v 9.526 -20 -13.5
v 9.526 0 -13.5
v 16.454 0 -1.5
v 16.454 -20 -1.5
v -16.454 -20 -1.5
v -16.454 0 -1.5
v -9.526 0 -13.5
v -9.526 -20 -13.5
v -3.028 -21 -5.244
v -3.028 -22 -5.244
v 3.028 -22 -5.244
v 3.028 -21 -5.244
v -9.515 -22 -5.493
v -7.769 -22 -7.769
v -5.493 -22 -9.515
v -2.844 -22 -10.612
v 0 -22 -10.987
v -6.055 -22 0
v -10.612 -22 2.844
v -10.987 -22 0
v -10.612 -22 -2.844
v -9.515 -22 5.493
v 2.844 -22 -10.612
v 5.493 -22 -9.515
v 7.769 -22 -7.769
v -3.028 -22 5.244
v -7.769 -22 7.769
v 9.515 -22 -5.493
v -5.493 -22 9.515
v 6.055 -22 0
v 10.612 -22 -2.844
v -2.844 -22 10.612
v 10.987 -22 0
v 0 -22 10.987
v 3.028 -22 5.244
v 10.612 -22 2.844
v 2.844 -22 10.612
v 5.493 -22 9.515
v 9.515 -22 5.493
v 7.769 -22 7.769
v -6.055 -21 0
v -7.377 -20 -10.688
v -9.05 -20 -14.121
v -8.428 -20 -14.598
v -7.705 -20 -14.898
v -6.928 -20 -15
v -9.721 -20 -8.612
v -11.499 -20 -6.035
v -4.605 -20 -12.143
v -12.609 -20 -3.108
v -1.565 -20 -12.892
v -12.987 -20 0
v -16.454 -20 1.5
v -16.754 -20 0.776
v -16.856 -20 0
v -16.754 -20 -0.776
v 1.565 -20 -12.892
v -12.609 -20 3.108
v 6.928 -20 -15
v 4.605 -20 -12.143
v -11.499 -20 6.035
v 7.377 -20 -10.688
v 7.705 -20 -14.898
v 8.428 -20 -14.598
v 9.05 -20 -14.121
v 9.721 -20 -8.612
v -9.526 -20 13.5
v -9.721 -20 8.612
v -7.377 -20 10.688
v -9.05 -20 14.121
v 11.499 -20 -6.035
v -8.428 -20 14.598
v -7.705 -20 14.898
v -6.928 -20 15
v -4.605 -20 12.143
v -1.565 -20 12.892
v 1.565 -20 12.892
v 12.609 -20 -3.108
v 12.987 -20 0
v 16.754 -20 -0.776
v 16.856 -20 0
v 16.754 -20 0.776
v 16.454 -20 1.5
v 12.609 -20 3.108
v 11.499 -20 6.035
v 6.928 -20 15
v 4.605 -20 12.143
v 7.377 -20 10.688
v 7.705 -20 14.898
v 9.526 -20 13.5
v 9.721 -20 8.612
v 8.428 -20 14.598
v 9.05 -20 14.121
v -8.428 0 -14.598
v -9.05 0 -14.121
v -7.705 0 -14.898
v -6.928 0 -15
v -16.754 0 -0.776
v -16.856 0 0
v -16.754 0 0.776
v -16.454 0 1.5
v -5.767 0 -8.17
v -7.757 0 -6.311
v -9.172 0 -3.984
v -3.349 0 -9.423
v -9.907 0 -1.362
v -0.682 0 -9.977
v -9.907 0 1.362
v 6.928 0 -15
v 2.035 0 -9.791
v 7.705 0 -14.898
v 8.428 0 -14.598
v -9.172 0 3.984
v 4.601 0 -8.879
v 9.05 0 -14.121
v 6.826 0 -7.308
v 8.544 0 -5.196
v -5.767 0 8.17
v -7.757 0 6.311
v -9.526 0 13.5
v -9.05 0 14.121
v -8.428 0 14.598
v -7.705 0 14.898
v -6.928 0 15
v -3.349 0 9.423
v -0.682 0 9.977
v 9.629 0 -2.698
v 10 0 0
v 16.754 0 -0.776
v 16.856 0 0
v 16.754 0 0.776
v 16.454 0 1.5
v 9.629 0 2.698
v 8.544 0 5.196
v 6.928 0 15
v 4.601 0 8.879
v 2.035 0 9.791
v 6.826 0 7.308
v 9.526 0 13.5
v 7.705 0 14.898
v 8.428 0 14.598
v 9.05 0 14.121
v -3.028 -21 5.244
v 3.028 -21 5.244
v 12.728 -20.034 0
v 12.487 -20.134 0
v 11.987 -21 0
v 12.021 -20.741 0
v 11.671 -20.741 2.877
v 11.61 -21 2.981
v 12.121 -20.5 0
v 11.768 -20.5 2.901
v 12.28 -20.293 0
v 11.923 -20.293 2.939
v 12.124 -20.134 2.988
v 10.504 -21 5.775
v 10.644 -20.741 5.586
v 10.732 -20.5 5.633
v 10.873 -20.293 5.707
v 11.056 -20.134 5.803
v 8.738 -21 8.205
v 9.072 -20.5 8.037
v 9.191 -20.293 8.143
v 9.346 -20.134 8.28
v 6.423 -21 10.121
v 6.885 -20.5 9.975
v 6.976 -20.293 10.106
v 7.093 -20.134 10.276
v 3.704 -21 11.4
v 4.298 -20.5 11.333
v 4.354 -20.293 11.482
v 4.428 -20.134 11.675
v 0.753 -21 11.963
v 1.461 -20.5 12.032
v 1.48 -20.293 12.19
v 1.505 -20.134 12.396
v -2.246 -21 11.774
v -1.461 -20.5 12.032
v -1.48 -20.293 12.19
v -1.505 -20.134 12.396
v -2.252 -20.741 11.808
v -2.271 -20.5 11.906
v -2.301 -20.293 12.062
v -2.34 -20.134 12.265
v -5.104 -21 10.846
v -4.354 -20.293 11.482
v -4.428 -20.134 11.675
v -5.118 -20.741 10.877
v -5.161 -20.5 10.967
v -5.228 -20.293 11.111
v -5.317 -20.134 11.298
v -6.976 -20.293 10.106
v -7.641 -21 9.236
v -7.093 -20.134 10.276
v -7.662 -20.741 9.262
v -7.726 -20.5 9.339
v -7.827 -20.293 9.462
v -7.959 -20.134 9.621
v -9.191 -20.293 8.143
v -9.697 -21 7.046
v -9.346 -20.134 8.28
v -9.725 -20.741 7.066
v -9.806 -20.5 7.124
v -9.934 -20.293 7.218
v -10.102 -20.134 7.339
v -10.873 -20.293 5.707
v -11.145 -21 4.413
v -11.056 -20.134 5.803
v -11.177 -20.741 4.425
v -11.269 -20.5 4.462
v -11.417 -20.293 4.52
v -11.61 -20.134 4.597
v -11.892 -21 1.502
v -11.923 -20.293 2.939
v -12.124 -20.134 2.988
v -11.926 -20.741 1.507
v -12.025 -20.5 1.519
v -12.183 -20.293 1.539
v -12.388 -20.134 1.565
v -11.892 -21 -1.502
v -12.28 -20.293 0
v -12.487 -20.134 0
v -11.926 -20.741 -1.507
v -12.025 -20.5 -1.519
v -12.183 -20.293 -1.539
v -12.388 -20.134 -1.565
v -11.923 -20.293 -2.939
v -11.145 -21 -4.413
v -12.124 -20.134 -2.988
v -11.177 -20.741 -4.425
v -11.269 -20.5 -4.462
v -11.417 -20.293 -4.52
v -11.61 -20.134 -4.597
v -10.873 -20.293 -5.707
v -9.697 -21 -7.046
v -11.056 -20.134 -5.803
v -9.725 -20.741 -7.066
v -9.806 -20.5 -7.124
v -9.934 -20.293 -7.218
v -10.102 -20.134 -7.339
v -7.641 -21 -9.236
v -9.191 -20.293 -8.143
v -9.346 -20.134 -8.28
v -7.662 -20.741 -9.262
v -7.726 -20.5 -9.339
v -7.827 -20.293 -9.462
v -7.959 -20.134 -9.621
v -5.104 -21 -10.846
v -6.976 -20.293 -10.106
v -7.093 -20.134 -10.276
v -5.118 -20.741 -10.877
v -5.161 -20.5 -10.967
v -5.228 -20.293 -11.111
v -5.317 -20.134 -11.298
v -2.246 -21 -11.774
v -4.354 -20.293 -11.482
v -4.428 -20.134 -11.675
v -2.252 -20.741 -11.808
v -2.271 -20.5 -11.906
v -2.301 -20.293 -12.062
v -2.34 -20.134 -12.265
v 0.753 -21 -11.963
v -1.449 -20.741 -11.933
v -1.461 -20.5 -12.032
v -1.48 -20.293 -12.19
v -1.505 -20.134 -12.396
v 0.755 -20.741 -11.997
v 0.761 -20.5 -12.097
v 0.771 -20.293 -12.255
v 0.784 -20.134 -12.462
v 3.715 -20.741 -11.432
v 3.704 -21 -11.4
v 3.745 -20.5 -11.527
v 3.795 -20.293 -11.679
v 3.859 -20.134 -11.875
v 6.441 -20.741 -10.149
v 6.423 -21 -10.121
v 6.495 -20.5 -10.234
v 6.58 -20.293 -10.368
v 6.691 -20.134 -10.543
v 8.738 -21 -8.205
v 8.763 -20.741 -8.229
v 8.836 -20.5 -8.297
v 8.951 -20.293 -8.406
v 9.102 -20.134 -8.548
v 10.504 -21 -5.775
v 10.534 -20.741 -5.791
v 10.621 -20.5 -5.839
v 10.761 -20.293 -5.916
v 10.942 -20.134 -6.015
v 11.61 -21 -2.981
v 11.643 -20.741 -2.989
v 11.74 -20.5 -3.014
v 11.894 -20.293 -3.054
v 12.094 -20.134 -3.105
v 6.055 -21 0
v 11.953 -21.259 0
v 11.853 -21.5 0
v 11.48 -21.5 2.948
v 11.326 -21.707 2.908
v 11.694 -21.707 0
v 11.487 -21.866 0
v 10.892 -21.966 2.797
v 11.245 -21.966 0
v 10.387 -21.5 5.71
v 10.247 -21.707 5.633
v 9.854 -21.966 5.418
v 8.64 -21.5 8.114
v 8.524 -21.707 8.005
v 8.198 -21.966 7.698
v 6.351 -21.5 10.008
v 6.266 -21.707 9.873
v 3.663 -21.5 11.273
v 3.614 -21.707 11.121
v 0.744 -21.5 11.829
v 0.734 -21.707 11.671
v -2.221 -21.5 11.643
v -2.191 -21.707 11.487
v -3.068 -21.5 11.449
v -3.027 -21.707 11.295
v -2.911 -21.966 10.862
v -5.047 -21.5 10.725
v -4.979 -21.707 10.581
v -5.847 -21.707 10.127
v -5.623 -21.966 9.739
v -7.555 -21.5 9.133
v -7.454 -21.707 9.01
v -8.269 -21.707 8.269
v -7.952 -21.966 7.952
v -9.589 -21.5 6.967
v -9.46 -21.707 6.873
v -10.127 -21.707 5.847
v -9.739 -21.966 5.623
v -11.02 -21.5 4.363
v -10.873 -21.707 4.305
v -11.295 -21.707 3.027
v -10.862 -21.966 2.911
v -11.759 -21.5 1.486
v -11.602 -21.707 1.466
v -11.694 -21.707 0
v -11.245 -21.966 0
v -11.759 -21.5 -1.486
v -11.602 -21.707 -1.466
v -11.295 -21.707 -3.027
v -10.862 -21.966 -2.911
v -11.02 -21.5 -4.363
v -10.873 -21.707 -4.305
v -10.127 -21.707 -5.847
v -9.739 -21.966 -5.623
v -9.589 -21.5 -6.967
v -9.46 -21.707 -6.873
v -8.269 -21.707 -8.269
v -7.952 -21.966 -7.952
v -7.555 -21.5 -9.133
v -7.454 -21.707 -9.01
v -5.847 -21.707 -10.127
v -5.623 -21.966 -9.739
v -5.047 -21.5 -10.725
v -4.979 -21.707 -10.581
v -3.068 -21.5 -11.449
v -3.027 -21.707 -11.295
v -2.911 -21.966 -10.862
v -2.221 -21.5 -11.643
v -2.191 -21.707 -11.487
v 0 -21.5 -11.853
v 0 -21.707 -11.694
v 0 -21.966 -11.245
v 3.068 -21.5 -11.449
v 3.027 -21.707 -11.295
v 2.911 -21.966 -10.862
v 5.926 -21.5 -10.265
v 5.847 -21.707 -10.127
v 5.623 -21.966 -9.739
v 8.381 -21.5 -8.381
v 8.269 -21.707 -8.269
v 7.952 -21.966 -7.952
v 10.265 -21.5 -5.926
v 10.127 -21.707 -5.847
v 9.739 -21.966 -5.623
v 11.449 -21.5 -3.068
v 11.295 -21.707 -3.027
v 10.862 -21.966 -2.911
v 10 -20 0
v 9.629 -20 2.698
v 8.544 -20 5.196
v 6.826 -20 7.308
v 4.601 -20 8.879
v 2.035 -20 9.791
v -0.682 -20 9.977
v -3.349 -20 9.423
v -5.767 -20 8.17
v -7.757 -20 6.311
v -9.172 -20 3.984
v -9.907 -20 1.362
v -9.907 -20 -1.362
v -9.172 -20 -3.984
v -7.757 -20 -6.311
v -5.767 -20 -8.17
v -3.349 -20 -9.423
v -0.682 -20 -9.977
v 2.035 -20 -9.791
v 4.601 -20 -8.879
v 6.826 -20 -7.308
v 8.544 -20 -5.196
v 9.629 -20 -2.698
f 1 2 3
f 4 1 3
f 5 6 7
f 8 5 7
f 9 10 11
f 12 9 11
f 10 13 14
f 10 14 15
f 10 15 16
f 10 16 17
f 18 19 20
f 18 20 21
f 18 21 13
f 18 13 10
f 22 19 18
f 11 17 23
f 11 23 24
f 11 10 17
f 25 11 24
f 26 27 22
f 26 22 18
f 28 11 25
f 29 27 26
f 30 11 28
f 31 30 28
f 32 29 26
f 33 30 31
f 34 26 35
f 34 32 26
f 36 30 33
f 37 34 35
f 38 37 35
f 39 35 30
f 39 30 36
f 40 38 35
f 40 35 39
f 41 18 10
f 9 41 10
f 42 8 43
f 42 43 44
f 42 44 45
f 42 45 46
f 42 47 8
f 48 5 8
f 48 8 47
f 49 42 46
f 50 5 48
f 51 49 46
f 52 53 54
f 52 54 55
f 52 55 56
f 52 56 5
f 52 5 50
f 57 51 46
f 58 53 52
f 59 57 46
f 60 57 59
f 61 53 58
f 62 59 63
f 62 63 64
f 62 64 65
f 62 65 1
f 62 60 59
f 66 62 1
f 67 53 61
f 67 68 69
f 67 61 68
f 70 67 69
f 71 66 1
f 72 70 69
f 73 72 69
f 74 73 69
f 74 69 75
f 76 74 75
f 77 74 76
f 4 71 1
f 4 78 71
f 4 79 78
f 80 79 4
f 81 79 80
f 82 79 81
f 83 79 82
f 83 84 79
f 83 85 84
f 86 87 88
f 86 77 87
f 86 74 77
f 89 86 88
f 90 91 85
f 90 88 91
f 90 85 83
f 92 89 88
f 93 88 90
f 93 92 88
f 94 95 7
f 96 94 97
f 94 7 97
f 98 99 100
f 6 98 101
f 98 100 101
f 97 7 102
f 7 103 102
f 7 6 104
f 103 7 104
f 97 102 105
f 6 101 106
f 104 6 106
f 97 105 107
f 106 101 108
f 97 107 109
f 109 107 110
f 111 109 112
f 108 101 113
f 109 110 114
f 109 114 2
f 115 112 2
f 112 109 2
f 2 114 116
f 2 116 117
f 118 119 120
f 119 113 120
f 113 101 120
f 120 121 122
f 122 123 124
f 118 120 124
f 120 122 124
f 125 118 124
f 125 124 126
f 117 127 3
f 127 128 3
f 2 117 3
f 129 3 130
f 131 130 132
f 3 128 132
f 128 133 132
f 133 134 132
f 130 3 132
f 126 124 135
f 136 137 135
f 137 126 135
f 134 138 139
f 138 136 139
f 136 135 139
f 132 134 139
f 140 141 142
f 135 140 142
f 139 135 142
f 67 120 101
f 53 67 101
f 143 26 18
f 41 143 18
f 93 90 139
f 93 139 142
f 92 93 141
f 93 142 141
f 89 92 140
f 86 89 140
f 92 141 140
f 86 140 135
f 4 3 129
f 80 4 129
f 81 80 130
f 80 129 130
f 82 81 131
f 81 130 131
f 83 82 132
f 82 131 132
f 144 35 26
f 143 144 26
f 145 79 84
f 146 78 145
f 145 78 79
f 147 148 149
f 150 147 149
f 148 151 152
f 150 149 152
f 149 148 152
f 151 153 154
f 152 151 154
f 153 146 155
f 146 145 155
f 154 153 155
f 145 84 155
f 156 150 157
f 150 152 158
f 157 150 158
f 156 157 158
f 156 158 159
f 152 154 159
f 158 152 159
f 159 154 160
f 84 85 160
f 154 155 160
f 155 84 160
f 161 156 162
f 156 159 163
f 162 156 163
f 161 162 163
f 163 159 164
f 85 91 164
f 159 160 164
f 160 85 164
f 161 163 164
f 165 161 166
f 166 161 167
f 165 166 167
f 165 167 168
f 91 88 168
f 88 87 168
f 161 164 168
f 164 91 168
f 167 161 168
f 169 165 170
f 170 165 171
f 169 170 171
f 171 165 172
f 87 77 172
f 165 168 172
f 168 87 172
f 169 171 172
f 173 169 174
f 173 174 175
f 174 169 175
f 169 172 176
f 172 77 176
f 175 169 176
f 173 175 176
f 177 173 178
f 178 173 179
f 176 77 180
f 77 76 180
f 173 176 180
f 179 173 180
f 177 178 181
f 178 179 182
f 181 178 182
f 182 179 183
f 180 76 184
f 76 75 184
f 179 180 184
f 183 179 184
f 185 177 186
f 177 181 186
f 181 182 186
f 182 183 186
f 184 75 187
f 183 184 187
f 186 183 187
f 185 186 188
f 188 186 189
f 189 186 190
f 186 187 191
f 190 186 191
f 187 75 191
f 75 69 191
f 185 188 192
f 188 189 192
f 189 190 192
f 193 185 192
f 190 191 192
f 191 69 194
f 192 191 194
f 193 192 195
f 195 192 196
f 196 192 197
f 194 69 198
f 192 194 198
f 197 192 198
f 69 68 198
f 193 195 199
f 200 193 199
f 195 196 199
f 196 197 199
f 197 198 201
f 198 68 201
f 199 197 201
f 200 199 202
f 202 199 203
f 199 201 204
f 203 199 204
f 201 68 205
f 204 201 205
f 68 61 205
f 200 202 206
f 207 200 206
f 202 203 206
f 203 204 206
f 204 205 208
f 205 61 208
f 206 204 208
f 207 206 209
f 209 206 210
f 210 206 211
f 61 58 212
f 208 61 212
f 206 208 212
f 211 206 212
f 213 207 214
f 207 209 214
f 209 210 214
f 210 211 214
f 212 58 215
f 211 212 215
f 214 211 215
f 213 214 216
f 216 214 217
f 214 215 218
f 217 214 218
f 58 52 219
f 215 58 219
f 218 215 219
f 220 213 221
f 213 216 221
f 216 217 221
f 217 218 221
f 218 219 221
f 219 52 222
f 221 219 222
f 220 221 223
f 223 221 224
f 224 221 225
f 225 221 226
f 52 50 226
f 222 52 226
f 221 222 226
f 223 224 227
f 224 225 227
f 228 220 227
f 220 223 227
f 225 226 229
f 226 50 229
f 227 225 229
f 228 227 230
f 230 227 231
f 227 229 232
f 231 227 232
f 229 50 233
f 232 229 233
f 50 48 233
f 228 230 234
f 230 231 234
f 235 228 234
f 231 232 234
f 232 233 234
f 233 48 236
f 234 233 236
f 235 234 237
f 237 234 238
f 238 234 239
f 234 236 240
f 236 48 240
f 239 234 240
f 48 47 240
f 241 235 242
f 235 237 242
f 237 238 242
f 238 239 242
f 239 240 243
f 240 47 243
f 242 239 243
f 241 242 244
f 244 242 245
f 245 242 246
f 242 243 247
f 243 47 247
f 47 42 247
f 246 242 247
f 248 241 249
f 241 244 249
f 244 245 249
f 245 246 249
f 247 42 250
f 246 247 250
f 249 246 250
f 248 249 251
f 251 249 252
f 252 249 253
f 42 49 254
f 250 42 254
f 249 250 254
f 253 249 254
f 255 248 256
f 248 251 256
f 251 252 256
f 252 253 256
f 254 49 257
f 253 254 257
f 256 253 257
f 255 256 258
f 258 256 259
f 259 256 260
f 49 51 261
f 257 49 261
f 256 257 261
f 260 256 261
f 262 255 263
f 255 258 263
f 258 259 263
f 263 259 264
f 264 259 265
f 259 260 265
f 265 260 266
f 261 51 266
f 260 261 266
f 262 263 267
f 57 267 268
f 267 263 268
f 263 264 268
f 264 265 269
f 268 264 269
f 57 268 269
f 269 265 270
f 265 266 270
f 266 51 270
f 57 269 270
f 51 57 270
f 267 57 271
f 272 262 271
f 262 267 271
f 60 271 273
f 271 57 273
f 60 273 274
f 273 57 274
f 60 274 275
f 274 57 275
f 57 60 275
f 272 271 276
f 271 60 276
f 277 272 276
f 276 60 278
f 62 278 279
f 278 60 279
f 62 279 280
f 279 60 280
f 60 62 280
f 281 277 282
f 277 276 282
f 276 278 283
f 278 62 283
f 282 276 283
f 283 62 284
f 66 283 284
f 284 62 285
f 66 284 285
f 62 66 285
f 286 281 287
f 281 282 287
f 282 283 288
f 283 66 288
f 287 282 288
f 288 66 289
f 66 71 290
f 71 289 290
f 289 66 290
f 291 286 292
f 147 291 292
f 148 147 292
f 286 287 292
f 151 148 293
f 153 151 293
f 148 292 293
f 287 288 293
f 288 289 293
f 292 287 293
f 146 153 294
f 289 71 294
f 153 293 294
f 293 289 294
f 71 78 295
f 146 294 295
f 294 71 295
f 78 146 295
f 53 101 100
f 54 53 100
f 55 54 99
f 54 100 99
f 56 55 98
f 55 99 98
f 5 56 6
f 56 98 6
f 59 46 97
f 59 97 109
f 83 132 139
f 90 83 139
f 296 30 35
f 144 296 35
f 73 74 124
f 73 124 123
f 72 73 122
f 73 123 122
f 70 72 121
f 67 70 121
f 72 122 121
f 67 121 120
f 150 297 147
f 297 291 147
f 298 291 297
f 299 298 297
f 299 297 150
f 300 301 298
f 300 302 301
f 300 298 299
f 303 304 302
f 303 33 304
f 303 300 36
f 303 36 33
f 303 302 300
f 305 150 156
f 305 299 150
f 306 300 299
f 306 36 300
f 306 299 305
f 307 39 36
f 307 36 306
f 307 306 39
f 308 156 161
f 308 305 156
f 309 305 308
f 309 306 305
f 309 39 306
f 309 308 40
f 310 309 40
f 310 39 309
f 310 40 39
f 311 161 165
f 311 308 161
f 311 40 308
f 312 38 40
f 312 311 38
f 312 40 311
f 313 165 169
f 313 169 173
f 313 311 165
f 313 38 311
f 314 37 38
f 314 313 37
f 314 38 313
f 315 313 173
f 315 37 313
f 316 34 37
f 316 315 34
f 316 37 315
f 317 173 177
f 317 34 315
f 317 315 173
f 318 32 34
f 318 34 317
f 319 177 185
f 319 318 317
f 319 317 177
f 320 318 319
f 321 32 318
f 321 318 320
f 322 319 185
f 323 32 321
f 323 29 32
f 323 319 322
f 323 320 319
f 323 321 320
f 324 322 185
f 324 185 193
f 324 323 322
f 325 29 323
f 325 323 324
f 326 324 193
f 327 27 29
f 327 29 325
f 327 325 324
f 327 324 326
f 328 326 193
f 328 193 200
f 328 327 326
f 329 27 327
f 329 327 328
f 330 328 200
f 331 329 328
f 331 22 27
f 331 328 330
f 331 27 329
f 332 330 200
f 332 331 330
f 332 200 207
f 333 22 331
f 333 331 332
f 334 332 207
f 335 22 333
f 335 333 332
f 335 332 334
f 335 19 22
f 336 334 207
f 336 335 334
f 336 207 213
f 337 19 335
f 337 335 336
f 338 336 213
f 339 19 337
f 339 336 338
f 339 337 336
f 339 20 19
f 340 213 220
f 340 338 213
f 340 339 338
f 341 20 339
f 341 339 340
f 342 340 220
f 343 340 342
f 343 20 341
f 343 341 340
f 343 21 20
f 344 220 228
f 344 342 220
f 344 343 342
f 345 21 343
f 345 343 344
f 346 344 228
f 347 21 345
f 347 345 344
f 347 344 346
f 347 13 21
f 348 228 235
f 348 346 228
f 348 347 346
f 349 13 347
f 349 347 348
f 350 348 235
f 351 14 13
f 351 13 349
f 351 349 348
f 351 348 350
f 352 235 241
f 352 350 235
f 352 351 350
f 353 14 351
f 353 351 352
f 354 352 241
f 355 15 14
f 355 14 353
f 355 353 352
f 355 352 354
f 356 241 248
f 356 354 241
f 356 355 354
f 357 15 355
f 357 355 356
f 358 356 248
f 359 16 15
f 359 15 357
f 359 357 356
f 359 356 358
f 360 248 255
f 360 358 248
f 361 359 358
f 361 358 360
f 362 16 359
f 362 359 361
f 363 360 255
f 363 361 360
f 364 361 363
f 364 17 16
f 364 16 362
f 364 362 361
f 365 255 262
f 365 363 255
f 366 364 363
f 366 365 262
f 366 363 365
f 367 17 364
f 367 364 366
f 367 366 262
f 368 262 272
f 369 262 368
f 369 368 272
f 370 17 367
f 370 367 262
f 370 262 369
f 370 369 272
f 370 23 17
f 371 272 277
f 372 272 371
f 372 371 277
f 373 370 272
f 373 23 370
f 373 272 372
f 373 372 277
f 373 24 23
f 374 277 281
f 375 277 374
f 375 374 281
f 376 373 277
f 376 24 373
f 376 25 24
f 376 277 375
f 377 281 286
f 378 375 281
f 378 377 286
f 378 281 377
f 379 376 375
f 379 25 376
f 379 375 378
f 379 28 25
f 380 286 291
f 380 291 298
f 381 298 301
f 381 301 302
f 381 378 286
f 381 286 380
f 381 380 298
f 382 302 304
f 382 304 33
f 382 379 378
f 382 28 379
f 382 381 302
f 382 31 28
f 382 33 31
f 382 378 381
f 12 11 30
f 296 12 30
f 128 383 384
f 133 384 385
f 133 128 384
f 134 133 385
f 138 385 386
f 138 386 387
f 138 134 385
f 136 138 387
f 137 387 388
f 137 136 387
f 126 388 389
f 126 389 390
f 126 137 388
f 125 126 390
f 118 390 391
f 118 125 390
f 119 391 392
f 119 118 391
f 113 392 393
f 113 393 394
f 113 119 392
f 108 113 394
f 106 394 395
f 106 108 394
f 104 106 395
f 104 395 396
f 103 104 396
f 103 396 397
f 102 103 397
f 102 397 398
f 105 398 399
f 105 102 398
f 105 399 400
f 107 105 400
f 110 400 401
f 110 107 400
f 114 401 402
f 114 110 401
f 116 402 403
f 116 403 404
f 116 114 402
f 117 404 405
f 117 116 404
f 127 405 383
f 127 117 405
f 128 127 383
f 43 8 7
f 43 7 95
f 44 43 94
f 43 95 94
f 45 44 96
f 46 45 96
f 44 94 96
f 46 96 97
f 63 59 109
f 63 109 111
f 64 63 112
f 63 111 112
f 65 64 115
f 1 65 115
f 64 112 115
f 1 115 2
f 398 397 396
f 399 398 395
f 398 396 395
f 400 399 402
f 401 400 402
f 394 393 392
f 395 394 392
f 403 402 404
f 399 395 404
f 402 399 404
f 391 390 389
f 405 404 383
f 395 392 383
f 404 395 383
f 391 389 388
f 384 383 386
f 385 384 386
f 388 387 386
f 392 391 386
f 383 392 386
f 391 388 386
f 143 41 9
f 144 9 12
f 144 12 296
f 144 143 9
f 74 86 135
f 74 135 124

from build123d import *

# Parameters (mm, degrees)
F0_R     = 10
F1_DEPTH = 20
F2_R     = 11.9866247271
F3_DEPTH = 2
F4_R     = 0.99999
F6_DEPTH = 1


# Not quite as in the source:
# - a fillet or chamfer is up to 0.001 mm smaller than in the source, because OpenCascade refuses the exact size


with BuildPart() as f1:
    # F0 (on Front) → F1 (new body)
    with BuildSketch(Plane.XZ):
        with BuildLine():
            Line((6.9282032303, 15), (-6.9282032303, 15))
            ThreePointArc((-6.9282032303, 15), (-8.4282032303, 14.5980762114), (-9.5262794416, 13.5))
            Line((-9.5262794416, 13.5), (-16.4544826719, 1.5))
            ThreePointArc((-16.4544826719, 1.5), (-16.8564064606, 0), (-16.4544826719, -1.5))
            Line((-16.4544826719, -1.5), (-9.5262794416, -13.5))
            ThreePointArc((-9.5262794416, -13.5), (-8.4282032303, -14.5980762114), (-6.9282032303, -15))
            Line((-6.9282032303, -15), (6.9282032303, -15))
            ThreePointArc((6.9282032303, -15), (8.4282032303, -14.5980762114), (9.5262794416, -13.5))
            Line((9.5262794416, -13.5), (16.4544826719, -1.5))
            ThreePointArc((16.4544826719, -1.5), (16.8564064606, 0), (16.4544826719, 1.5))
            Line((16.4544826719, 1.5), (9.5262794416, 13.5))
            ThreePointArc((9.5262794416, 13.5), (8.4282032303, 14.5980762114), (6.9282032303, 15))
        make_face()
        Circle(F0_R, mode=Mode.SUBTRACT)
    extrude(amount=F1_DEPTH)

    # F2 (on face) → F3 (join)
    with BuildSketch(Plane.XZ.offset(20)):
        Circle(F2_R)
    extrude(amount=F3_DEPTH)

    # F4 (radius 1 in the source; OpenCascade refuses exactly that, so slightly less here)
    f4_edges = [f1.edges().sort_by_distance(p)[0] for p in [
        (-11.986625, -22, 0),
        (-11.986625, -20, 0),
    ]]
    fillet(f4_edges, radius=F4_R)

    # F5 (on face) → F6 (cut)
    with BuildSketch(Plane.XZ.offset(22)):
        Polygon((3.027519893, 5.2438182756), (-3.027519893, 5.2438182756), (-6.055039786, 0), (-3.027519893, -5.2438182756), (3.027519893, -5.2438182756), (6.055039786, 0), align=None)
    extrude(amount=-F6_DEPTH, mode=Mode.SUBTRACT)


solid = f1.part
